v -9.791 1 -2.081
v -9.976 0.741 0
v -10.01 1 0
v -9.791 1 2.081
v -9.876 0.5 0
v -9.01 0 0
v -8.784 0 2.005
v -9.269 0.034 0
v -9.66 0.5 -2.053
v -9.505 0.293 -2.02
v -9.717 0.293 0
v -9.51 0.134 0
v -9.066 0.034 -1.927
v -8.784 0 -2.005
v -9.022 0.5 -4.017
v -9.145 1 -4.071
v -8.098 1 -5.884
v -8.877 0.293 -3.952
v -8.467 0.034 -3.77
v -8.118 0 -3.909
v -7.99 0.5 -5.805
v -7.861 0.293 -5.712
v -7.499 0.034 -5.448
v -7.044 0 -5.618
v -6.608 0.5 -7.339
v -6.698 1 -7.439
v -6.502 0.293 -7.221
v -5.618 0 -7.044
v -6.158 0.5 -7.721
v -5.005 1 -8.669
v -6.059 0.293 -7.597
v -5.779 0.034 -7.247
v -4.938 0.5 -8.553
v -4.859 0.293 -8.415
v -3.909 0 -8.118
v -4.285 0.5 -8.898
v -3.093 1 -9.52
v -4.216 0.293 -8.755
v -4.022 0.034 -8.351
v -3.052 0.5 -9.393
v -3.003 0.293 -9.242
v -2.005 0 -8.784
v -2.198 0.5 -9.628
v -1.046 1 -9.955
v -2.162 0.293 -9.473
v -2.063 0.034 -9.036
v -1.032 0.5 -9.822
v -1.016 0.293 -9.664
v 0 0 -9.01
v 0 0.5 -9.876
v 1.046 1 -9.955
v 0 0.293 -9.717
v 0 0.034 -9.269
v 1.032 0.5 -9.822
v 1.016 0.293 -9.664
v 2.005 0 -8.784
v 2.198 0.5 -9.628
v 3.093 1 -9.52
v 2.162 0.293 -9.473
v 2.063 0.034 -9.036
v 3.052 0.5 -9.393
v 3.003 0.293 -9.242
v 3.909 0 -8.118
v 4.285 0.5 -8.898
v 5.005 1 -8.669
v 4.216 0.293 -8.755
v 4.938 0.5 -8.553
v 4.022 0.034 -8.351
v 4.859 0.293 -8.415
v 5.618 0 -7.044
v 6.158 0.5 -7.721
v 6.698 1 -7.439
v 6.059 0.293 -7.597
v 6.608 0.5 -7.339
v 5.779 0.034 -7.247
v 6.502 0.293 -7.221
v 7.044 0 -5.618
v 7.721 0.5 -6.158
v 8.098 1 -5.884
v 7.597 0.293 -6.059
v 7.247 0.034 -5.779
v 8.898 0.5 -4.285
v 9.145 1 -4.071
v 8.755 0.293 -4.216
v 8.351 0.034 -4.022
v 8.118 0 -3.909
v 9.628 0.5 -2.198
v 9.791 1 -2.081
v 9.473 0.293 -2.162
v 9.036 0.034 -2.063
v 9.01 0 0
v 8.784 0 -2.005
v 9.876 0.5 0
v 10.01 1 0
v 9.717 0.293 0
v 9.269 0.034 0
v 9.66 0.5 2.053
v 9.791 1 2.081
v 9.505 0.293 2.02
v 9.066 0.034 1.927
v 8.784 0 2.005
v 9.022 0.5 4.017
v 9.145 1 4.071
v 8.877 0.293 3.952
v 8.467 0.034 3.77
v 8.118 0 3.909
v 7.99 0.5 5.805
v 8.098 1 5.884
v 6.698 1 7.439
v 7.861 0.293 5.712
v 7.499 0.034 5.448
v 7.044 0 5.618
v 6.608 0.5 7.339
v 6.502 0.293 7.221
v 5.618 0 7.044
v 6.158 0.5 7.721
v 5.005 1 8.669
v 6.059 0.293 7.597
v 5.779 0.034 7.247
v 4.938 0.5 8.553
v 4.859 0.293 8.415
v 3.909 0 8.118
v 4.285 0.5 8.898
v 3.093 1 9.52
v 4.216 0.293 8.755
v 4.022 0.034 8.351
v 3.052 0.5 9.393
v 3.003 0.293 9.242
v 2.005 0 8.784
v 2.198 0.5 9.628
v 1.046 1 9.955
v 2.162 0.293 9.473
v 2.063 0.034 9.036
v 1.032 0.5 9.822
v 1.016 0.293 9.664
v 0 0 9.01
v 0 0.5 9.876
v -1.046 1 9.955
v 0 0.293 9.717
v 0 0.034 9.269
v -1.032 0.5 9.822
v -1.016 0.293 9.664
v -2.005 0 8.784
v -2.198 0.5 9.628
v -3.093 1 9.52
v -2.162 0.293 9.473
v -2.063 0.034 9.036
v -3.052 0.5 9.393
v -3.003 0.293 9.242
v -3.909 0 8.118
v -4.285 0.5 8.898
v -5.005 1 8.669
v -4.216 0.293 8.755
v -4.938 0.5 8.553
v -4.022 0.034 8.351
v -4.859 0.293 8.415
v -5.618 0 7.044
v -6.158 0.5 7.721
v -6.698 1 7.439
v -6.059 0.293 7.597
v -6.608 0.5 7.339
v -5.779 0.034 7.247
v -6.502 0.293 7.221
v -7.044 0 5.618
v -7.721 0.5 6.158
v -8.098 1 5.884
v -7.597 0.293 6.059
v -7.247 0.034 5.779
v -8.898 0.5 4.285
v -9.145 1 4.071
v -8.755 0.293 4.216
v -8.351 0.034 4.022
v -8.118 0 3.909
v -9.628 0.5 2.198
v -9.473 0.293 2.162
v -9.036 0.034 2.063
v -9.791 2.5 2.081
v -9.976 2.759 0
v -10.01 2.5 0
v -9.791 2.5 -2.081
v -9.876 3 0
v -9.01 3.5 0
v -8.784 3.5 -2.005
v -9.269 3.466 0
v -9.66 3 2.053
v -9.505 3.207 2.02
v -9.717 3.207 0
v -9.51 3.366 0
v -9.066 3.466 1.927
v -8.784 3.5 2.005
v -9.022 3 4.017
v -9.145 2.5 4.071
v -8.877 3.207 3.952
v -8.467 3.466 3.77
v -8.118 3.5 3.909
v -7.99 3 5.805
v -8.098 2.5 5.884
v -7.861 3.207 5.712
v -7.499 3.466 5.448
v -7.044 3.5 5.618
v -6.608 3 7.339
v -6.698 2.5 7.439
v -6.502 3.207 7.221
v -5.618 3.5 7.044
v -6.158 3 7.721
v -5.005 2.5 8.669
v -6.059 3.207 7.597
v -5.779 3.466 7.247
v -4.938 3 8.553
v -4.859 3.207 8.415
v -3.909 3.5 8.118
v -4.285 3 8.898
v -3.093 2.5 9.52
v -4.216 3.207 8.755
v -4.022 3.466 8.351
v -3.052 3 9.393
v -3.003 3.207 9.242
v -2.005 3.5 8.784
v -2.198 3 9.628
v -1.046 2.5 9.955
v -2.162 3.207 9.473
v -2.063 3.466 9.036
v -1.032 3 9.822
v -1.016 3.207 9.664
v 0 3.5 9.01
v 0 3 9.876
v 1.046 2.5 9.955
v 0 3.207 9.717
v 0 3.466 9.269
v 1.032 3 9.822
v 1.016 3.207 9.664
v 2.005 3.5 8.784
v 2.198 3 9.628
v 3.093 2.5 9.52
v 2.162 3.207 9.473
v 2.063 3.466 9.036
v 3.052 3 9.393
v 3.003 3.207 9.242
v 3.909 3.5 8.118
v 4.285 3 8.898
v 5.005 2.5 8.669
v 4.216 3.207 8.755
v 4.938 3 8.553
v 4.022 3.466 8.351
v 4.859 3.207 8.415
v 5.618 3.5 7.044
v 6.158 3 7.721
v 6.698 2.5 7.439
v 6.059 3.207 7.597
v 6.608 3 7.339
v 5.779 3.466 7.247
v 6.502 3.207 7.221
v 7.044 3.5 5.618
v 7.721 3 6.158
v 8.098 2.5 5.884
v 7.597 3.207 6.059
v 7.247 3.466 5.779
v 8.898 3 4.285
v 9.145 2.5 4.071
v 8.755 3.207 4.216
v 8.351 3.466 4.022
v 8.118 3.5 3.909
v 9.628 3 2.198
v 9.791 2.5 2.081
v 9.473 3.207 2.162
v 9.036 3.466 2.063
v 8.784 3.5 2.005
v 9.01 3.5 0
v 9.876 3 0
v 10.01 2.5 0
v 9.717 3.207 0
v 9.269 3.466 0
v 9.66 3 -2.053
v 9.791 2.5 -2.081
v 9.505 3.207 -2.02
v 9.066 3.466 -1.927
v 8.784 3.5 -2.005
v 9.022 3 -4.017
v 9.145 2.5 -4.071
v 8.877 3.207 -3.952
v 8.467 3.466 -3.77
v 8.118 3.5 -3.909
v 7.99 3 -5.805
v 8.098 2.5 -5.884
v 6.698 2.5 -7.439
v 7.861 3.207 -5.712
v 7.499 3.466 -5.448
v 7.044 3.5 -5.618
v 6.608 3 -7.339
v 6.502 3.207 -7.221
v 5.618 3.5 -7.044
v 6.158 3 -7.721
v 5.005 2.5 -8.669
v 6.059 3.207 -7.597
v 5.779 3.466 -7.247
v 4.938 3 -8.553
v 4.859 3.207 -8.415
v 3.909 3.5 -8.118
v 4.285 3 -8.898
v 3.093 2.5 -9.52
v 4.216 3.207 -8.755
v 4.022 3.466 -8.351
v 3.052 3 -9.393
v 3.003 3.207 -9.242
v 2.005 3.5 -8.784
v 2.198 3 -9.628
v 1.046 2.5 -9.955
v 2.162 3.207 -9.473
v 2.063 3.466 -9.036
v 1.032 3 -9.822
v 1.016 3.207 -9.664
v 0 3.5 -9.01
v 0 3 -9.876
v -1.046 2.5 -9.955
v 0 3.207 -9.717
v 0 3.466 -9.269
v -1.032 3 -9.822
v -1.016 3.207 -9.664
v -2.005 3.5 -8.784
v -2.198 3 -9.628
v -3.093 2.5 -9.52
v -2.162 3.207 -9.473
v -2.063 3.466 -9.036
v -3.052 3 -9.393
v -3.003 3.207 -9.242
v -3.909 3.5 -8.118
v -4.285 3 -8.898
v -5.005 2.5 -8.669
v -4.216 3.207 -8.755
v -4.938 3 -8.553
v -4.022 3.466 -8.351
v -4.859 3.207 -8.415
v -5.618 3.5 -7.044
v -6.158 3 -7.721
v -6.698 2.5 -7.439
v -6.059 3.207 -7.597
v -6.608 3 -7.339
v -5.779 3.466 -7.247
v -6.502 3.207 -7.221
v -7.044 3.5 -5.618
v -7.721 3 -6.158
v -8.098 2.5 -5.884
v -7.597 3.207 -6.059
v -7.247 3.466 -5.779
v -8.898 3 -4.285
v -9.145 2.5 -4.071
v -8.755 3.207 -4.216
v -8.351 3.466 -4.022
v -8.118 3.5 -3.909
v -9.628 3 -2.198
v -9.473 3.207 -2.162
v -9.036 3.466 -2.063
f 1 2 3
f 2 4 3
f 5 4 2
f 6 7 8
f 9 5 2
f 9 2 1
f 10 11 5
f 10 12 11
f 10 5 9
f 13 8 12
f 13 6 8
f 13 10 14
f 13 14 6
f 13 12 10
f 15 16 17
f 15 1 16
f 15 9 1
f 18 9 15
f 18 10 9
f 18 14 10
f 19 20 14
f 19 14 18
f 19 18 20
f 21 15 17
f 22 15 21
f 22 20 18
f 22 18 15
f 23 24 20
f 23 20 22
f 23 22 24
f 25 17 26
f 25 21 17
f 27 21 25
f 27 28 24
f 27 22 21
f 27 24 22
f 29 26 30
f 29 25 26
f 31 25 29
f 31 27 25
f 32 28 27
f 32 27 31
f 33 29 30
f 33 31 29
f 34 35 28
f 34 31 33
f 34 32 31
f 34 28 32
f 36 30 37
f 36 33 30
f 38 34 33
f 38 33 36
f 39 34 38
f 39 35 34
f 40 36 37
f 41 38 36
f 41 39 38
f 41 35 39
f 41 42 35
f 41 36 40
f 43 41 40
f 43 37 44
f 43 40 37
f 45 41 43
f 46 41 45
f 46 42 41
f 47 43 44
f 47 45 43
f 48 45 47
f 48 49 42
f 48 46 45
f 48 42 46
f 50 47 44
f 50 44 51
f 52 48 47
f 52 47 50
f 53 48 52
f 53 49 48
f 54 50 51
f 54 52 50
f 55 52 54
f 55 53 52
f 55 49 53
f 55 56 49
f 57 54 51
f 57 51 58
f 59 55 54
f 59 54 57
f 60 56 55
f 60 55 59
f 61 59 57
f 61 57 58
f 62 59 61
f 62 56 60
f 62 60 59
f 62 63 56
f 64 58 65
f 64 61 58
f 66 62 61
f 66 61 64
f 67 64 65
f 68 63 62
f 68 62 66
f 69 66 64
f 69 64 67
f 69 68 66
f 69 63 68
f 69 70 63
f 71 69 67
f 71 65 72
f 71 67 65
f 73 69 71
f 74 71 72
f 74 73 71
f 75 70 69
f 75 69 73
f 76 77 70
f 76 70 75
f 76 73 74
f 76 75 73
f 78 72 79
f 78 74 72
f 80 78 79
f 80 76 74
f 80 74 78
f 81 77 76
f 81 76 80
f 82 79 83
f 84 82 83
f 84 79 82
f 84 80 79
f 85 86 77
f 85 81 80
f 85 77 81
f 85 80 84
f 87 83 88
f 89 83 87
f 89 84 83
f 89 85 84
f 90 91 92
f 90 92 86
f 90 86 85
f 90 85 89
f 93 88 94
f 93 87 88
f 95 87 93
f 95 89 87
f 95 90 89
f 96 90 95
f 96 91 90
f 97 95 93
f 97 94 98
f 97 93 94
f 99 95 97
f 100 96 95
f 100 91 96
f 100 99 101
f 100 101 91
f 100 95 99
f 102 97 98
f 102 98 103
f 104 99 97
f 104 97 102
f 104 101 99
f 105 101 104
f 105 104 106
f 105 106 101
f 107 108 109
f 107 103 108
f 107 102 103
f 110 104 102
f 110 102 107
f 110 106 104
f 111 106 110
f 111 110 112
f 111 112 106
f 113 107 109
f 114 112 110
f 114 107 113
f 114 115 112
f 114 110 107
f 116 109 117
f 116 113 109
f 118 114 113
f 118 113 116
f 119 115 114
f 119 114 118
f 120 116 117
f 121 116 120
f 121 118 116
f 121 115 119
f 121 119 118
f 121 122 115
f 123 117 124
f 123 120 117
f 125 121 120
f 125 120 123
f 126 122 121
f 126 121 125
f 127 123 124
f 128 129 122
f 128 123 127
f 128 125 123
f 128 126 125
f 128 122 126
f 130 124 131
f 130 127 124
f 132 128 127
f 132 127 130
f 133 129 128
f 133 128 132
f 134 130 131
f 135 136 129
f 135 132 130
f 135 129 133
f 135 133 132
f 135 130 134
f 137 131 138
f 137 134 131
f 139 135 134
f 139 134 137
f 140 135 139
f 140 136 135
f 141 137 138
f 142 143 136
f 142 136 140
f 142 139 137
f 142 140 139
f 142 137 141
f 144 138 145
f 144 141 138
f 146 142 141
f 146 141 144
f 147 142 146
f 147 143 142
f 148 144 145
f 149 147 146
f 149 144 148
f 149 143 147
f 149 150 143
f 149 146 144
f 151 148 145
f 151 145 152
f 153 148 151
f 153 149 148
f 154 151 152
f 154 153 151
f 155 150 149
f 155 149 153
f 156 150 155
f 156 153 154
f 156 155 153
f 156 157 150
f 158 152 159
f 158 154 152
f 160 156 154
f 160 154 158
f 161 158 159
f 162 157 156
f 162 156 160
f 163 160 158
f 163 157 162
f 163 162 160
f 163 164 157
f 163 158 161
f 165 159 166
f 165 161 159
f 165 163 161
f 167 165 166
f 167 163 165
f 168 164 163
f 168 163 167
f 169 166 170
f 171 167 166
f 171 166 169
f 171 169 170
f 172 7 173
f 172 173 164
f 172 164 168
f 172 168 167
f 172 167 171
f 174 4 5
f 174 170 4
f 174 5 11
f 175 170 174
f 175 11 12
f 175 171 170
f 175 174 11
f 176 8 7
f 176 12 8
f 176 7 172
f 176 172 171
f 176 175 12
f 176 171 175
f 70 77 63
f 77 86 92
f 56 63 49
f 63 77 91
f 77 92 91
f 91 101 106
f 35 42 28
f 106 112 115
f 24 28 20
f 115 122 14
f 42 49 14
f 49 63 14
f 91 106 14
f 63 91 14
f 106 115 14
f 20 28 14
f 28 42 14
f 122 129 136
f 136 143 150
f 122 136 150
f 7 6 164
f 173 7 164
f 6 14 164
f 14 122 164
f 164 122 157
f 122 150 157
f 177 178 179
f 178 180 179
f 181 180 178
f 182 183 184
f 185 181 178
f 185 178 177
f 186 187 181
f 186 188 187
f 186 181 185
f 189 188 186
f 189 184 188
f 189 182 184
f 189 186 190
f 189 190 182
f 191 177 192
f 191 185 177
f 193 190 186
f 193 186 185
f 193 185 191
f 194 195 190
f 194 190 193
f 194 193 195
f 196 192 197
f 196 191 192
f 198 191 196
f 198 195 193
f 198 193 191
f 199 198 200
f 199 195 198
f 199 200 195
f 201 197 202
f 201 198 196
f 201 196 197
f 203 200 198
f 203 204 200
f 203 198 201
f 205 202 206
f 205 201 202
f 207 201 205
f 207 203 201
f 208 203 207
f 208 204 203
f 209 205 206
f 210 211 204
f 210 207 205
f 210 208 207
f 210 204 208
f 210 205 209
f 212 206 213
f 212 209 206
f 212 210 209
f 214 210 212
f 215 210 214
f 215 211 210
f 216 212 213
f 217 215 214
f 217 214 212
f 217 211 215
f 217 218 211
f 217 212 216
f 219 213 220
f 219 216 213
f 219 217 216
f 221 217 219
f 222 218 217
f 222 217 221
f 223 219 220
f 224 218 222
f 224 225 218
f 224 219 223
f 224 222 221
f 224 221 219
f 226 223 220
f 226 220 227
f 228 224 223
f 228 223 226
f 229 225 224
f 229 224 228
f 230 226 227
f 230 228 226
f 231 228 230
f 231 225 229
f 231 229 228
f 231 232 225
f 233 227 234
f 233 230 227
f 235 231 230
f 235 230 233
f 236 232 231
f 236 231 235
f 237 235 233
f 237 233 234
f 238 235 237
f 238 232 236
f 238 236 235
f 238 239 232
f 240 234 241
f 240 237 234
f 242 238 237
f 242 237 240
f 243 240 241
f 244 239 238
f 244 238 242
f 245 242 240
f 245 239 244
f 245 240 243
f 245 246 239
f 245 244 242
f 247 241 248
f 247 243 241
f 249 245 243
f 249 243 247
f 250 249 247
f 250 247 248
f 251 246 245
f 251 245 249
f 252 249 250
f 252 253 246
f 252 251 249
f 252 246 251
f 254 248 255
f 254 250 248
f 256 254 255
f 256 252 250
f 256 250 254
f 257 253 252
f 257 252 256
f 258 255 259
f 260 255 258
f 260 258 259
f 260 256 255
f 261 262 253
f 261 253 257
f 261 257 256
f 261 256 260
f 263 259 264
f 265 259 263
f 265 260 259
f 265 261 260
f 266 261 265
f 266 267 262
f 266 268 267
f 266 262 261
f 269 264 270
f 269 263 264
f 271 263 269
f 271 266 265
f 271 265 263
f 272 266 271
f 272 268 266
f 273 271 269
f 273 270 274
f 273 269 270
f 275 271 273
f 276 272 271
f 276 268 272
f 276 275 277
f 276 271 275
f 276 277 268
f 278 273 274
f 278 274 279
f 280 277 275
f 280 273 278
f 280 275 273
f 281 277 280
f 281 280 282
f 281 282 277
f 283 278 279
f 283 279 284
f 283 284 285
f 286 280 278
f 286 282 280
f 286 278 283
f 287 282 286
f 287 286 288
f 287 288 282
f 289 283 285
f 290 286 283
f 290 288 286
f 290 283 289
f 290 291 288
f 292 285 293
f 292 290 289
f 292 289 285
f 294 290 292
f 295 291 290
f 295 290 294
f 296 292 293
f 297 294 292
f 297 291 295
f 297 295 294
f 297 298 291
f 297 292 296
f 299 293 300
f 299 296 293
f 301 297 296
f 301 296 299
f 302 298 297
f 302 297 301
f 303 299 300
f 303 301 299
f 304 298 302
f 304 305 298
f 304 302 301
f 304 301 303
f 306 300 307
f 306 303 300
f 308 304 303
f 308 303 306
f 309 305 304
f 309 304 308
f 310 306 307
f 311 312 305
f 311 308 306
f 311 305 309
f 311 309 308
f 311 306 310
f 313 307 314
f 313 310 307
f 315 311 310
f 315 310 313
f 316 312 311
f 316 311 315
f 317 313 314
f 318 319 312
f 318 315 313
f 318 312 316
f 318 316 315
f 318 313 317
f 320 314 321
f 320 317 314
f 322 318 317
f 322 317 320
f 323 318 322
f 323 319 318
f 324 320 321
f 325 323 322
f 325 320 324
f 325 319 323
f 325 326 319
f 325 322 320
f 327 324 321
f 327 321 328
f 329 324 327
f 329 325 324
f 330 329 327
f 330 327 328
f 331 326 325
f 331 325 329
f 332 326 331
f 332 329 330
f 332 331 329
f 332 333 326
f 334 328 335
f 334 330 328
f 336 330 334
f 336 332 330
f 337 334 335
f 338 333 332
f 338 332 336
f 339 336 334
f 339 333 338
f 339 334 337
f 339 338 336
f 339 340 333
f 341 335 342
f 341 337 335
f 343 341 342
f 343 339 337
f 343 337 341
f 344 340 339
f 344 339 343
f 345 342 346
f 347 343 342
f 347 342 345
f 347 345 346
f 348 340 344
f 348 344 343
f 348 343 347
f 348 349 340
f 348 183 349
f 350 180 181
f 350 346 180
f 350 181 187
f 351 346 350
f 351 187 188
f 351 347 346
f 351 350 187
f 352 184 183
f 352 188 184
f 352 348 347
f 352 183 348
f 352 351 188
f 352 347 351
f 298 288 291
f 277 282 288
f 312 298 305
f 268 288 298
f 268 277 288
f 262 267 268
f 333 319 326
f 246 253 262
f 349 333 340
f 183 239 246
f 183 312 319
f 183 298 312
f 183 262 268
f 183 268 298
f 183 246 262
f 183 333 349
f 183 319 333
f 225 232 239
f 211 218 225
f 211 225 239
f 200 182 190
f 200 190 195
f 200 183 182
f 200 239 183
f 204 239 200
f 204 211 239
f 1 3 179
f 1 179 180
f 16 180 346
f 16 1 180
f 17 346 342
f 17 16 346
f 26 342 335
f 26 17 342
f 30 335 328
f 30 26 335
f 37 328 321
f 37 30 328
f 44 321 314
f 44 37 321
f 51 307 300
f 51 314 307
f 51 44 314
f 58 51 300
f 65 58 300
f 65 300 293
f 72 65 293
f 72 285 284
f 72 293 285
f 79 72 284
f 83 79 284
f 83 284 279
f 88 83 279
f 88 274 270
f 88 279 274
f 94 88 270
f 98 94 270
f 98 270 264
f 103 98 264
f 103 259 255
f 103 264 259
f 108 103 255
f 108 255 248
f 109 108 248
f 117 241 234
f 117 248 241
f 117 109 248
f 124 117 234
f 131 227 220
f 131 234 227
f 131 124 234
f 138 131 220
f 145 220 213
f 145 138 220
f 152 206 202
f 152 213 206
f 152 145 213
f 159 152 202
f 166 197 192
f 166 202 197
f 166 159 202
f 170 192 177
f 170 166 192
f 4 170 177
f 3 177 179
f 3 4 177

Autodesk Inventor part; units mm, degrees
ref_plane "YZ Plane" through (0, 0, 0) normal (1, 0, 0) x (0, 1, 0)
ref_plane "XZ Plane" through (0, 0, 0) normal (0, 1, 0) x (-1, 0, 0)
ref_plane "XY Plane" through (0, 0, 0) normal (0, 0, 1) x (1, 0, 0)
sketch "Sketch1" plane through (0, 0, 0) normal (0, 1, 0) x (-1, 0, 0)
  circle A0 centre (0, 0) radius 10.01
  dimension "d0" = 20.02
extrude "Extrusion1" add sketch "Sketch1" along normal blind 3.5
fillet "Fillet1" radius 1 1 edges at (10.01, 3.5, 0)
fillet "Fillet2" radius 1 1 edges at (10.01, 0, 0)
properties part number "Battery"
